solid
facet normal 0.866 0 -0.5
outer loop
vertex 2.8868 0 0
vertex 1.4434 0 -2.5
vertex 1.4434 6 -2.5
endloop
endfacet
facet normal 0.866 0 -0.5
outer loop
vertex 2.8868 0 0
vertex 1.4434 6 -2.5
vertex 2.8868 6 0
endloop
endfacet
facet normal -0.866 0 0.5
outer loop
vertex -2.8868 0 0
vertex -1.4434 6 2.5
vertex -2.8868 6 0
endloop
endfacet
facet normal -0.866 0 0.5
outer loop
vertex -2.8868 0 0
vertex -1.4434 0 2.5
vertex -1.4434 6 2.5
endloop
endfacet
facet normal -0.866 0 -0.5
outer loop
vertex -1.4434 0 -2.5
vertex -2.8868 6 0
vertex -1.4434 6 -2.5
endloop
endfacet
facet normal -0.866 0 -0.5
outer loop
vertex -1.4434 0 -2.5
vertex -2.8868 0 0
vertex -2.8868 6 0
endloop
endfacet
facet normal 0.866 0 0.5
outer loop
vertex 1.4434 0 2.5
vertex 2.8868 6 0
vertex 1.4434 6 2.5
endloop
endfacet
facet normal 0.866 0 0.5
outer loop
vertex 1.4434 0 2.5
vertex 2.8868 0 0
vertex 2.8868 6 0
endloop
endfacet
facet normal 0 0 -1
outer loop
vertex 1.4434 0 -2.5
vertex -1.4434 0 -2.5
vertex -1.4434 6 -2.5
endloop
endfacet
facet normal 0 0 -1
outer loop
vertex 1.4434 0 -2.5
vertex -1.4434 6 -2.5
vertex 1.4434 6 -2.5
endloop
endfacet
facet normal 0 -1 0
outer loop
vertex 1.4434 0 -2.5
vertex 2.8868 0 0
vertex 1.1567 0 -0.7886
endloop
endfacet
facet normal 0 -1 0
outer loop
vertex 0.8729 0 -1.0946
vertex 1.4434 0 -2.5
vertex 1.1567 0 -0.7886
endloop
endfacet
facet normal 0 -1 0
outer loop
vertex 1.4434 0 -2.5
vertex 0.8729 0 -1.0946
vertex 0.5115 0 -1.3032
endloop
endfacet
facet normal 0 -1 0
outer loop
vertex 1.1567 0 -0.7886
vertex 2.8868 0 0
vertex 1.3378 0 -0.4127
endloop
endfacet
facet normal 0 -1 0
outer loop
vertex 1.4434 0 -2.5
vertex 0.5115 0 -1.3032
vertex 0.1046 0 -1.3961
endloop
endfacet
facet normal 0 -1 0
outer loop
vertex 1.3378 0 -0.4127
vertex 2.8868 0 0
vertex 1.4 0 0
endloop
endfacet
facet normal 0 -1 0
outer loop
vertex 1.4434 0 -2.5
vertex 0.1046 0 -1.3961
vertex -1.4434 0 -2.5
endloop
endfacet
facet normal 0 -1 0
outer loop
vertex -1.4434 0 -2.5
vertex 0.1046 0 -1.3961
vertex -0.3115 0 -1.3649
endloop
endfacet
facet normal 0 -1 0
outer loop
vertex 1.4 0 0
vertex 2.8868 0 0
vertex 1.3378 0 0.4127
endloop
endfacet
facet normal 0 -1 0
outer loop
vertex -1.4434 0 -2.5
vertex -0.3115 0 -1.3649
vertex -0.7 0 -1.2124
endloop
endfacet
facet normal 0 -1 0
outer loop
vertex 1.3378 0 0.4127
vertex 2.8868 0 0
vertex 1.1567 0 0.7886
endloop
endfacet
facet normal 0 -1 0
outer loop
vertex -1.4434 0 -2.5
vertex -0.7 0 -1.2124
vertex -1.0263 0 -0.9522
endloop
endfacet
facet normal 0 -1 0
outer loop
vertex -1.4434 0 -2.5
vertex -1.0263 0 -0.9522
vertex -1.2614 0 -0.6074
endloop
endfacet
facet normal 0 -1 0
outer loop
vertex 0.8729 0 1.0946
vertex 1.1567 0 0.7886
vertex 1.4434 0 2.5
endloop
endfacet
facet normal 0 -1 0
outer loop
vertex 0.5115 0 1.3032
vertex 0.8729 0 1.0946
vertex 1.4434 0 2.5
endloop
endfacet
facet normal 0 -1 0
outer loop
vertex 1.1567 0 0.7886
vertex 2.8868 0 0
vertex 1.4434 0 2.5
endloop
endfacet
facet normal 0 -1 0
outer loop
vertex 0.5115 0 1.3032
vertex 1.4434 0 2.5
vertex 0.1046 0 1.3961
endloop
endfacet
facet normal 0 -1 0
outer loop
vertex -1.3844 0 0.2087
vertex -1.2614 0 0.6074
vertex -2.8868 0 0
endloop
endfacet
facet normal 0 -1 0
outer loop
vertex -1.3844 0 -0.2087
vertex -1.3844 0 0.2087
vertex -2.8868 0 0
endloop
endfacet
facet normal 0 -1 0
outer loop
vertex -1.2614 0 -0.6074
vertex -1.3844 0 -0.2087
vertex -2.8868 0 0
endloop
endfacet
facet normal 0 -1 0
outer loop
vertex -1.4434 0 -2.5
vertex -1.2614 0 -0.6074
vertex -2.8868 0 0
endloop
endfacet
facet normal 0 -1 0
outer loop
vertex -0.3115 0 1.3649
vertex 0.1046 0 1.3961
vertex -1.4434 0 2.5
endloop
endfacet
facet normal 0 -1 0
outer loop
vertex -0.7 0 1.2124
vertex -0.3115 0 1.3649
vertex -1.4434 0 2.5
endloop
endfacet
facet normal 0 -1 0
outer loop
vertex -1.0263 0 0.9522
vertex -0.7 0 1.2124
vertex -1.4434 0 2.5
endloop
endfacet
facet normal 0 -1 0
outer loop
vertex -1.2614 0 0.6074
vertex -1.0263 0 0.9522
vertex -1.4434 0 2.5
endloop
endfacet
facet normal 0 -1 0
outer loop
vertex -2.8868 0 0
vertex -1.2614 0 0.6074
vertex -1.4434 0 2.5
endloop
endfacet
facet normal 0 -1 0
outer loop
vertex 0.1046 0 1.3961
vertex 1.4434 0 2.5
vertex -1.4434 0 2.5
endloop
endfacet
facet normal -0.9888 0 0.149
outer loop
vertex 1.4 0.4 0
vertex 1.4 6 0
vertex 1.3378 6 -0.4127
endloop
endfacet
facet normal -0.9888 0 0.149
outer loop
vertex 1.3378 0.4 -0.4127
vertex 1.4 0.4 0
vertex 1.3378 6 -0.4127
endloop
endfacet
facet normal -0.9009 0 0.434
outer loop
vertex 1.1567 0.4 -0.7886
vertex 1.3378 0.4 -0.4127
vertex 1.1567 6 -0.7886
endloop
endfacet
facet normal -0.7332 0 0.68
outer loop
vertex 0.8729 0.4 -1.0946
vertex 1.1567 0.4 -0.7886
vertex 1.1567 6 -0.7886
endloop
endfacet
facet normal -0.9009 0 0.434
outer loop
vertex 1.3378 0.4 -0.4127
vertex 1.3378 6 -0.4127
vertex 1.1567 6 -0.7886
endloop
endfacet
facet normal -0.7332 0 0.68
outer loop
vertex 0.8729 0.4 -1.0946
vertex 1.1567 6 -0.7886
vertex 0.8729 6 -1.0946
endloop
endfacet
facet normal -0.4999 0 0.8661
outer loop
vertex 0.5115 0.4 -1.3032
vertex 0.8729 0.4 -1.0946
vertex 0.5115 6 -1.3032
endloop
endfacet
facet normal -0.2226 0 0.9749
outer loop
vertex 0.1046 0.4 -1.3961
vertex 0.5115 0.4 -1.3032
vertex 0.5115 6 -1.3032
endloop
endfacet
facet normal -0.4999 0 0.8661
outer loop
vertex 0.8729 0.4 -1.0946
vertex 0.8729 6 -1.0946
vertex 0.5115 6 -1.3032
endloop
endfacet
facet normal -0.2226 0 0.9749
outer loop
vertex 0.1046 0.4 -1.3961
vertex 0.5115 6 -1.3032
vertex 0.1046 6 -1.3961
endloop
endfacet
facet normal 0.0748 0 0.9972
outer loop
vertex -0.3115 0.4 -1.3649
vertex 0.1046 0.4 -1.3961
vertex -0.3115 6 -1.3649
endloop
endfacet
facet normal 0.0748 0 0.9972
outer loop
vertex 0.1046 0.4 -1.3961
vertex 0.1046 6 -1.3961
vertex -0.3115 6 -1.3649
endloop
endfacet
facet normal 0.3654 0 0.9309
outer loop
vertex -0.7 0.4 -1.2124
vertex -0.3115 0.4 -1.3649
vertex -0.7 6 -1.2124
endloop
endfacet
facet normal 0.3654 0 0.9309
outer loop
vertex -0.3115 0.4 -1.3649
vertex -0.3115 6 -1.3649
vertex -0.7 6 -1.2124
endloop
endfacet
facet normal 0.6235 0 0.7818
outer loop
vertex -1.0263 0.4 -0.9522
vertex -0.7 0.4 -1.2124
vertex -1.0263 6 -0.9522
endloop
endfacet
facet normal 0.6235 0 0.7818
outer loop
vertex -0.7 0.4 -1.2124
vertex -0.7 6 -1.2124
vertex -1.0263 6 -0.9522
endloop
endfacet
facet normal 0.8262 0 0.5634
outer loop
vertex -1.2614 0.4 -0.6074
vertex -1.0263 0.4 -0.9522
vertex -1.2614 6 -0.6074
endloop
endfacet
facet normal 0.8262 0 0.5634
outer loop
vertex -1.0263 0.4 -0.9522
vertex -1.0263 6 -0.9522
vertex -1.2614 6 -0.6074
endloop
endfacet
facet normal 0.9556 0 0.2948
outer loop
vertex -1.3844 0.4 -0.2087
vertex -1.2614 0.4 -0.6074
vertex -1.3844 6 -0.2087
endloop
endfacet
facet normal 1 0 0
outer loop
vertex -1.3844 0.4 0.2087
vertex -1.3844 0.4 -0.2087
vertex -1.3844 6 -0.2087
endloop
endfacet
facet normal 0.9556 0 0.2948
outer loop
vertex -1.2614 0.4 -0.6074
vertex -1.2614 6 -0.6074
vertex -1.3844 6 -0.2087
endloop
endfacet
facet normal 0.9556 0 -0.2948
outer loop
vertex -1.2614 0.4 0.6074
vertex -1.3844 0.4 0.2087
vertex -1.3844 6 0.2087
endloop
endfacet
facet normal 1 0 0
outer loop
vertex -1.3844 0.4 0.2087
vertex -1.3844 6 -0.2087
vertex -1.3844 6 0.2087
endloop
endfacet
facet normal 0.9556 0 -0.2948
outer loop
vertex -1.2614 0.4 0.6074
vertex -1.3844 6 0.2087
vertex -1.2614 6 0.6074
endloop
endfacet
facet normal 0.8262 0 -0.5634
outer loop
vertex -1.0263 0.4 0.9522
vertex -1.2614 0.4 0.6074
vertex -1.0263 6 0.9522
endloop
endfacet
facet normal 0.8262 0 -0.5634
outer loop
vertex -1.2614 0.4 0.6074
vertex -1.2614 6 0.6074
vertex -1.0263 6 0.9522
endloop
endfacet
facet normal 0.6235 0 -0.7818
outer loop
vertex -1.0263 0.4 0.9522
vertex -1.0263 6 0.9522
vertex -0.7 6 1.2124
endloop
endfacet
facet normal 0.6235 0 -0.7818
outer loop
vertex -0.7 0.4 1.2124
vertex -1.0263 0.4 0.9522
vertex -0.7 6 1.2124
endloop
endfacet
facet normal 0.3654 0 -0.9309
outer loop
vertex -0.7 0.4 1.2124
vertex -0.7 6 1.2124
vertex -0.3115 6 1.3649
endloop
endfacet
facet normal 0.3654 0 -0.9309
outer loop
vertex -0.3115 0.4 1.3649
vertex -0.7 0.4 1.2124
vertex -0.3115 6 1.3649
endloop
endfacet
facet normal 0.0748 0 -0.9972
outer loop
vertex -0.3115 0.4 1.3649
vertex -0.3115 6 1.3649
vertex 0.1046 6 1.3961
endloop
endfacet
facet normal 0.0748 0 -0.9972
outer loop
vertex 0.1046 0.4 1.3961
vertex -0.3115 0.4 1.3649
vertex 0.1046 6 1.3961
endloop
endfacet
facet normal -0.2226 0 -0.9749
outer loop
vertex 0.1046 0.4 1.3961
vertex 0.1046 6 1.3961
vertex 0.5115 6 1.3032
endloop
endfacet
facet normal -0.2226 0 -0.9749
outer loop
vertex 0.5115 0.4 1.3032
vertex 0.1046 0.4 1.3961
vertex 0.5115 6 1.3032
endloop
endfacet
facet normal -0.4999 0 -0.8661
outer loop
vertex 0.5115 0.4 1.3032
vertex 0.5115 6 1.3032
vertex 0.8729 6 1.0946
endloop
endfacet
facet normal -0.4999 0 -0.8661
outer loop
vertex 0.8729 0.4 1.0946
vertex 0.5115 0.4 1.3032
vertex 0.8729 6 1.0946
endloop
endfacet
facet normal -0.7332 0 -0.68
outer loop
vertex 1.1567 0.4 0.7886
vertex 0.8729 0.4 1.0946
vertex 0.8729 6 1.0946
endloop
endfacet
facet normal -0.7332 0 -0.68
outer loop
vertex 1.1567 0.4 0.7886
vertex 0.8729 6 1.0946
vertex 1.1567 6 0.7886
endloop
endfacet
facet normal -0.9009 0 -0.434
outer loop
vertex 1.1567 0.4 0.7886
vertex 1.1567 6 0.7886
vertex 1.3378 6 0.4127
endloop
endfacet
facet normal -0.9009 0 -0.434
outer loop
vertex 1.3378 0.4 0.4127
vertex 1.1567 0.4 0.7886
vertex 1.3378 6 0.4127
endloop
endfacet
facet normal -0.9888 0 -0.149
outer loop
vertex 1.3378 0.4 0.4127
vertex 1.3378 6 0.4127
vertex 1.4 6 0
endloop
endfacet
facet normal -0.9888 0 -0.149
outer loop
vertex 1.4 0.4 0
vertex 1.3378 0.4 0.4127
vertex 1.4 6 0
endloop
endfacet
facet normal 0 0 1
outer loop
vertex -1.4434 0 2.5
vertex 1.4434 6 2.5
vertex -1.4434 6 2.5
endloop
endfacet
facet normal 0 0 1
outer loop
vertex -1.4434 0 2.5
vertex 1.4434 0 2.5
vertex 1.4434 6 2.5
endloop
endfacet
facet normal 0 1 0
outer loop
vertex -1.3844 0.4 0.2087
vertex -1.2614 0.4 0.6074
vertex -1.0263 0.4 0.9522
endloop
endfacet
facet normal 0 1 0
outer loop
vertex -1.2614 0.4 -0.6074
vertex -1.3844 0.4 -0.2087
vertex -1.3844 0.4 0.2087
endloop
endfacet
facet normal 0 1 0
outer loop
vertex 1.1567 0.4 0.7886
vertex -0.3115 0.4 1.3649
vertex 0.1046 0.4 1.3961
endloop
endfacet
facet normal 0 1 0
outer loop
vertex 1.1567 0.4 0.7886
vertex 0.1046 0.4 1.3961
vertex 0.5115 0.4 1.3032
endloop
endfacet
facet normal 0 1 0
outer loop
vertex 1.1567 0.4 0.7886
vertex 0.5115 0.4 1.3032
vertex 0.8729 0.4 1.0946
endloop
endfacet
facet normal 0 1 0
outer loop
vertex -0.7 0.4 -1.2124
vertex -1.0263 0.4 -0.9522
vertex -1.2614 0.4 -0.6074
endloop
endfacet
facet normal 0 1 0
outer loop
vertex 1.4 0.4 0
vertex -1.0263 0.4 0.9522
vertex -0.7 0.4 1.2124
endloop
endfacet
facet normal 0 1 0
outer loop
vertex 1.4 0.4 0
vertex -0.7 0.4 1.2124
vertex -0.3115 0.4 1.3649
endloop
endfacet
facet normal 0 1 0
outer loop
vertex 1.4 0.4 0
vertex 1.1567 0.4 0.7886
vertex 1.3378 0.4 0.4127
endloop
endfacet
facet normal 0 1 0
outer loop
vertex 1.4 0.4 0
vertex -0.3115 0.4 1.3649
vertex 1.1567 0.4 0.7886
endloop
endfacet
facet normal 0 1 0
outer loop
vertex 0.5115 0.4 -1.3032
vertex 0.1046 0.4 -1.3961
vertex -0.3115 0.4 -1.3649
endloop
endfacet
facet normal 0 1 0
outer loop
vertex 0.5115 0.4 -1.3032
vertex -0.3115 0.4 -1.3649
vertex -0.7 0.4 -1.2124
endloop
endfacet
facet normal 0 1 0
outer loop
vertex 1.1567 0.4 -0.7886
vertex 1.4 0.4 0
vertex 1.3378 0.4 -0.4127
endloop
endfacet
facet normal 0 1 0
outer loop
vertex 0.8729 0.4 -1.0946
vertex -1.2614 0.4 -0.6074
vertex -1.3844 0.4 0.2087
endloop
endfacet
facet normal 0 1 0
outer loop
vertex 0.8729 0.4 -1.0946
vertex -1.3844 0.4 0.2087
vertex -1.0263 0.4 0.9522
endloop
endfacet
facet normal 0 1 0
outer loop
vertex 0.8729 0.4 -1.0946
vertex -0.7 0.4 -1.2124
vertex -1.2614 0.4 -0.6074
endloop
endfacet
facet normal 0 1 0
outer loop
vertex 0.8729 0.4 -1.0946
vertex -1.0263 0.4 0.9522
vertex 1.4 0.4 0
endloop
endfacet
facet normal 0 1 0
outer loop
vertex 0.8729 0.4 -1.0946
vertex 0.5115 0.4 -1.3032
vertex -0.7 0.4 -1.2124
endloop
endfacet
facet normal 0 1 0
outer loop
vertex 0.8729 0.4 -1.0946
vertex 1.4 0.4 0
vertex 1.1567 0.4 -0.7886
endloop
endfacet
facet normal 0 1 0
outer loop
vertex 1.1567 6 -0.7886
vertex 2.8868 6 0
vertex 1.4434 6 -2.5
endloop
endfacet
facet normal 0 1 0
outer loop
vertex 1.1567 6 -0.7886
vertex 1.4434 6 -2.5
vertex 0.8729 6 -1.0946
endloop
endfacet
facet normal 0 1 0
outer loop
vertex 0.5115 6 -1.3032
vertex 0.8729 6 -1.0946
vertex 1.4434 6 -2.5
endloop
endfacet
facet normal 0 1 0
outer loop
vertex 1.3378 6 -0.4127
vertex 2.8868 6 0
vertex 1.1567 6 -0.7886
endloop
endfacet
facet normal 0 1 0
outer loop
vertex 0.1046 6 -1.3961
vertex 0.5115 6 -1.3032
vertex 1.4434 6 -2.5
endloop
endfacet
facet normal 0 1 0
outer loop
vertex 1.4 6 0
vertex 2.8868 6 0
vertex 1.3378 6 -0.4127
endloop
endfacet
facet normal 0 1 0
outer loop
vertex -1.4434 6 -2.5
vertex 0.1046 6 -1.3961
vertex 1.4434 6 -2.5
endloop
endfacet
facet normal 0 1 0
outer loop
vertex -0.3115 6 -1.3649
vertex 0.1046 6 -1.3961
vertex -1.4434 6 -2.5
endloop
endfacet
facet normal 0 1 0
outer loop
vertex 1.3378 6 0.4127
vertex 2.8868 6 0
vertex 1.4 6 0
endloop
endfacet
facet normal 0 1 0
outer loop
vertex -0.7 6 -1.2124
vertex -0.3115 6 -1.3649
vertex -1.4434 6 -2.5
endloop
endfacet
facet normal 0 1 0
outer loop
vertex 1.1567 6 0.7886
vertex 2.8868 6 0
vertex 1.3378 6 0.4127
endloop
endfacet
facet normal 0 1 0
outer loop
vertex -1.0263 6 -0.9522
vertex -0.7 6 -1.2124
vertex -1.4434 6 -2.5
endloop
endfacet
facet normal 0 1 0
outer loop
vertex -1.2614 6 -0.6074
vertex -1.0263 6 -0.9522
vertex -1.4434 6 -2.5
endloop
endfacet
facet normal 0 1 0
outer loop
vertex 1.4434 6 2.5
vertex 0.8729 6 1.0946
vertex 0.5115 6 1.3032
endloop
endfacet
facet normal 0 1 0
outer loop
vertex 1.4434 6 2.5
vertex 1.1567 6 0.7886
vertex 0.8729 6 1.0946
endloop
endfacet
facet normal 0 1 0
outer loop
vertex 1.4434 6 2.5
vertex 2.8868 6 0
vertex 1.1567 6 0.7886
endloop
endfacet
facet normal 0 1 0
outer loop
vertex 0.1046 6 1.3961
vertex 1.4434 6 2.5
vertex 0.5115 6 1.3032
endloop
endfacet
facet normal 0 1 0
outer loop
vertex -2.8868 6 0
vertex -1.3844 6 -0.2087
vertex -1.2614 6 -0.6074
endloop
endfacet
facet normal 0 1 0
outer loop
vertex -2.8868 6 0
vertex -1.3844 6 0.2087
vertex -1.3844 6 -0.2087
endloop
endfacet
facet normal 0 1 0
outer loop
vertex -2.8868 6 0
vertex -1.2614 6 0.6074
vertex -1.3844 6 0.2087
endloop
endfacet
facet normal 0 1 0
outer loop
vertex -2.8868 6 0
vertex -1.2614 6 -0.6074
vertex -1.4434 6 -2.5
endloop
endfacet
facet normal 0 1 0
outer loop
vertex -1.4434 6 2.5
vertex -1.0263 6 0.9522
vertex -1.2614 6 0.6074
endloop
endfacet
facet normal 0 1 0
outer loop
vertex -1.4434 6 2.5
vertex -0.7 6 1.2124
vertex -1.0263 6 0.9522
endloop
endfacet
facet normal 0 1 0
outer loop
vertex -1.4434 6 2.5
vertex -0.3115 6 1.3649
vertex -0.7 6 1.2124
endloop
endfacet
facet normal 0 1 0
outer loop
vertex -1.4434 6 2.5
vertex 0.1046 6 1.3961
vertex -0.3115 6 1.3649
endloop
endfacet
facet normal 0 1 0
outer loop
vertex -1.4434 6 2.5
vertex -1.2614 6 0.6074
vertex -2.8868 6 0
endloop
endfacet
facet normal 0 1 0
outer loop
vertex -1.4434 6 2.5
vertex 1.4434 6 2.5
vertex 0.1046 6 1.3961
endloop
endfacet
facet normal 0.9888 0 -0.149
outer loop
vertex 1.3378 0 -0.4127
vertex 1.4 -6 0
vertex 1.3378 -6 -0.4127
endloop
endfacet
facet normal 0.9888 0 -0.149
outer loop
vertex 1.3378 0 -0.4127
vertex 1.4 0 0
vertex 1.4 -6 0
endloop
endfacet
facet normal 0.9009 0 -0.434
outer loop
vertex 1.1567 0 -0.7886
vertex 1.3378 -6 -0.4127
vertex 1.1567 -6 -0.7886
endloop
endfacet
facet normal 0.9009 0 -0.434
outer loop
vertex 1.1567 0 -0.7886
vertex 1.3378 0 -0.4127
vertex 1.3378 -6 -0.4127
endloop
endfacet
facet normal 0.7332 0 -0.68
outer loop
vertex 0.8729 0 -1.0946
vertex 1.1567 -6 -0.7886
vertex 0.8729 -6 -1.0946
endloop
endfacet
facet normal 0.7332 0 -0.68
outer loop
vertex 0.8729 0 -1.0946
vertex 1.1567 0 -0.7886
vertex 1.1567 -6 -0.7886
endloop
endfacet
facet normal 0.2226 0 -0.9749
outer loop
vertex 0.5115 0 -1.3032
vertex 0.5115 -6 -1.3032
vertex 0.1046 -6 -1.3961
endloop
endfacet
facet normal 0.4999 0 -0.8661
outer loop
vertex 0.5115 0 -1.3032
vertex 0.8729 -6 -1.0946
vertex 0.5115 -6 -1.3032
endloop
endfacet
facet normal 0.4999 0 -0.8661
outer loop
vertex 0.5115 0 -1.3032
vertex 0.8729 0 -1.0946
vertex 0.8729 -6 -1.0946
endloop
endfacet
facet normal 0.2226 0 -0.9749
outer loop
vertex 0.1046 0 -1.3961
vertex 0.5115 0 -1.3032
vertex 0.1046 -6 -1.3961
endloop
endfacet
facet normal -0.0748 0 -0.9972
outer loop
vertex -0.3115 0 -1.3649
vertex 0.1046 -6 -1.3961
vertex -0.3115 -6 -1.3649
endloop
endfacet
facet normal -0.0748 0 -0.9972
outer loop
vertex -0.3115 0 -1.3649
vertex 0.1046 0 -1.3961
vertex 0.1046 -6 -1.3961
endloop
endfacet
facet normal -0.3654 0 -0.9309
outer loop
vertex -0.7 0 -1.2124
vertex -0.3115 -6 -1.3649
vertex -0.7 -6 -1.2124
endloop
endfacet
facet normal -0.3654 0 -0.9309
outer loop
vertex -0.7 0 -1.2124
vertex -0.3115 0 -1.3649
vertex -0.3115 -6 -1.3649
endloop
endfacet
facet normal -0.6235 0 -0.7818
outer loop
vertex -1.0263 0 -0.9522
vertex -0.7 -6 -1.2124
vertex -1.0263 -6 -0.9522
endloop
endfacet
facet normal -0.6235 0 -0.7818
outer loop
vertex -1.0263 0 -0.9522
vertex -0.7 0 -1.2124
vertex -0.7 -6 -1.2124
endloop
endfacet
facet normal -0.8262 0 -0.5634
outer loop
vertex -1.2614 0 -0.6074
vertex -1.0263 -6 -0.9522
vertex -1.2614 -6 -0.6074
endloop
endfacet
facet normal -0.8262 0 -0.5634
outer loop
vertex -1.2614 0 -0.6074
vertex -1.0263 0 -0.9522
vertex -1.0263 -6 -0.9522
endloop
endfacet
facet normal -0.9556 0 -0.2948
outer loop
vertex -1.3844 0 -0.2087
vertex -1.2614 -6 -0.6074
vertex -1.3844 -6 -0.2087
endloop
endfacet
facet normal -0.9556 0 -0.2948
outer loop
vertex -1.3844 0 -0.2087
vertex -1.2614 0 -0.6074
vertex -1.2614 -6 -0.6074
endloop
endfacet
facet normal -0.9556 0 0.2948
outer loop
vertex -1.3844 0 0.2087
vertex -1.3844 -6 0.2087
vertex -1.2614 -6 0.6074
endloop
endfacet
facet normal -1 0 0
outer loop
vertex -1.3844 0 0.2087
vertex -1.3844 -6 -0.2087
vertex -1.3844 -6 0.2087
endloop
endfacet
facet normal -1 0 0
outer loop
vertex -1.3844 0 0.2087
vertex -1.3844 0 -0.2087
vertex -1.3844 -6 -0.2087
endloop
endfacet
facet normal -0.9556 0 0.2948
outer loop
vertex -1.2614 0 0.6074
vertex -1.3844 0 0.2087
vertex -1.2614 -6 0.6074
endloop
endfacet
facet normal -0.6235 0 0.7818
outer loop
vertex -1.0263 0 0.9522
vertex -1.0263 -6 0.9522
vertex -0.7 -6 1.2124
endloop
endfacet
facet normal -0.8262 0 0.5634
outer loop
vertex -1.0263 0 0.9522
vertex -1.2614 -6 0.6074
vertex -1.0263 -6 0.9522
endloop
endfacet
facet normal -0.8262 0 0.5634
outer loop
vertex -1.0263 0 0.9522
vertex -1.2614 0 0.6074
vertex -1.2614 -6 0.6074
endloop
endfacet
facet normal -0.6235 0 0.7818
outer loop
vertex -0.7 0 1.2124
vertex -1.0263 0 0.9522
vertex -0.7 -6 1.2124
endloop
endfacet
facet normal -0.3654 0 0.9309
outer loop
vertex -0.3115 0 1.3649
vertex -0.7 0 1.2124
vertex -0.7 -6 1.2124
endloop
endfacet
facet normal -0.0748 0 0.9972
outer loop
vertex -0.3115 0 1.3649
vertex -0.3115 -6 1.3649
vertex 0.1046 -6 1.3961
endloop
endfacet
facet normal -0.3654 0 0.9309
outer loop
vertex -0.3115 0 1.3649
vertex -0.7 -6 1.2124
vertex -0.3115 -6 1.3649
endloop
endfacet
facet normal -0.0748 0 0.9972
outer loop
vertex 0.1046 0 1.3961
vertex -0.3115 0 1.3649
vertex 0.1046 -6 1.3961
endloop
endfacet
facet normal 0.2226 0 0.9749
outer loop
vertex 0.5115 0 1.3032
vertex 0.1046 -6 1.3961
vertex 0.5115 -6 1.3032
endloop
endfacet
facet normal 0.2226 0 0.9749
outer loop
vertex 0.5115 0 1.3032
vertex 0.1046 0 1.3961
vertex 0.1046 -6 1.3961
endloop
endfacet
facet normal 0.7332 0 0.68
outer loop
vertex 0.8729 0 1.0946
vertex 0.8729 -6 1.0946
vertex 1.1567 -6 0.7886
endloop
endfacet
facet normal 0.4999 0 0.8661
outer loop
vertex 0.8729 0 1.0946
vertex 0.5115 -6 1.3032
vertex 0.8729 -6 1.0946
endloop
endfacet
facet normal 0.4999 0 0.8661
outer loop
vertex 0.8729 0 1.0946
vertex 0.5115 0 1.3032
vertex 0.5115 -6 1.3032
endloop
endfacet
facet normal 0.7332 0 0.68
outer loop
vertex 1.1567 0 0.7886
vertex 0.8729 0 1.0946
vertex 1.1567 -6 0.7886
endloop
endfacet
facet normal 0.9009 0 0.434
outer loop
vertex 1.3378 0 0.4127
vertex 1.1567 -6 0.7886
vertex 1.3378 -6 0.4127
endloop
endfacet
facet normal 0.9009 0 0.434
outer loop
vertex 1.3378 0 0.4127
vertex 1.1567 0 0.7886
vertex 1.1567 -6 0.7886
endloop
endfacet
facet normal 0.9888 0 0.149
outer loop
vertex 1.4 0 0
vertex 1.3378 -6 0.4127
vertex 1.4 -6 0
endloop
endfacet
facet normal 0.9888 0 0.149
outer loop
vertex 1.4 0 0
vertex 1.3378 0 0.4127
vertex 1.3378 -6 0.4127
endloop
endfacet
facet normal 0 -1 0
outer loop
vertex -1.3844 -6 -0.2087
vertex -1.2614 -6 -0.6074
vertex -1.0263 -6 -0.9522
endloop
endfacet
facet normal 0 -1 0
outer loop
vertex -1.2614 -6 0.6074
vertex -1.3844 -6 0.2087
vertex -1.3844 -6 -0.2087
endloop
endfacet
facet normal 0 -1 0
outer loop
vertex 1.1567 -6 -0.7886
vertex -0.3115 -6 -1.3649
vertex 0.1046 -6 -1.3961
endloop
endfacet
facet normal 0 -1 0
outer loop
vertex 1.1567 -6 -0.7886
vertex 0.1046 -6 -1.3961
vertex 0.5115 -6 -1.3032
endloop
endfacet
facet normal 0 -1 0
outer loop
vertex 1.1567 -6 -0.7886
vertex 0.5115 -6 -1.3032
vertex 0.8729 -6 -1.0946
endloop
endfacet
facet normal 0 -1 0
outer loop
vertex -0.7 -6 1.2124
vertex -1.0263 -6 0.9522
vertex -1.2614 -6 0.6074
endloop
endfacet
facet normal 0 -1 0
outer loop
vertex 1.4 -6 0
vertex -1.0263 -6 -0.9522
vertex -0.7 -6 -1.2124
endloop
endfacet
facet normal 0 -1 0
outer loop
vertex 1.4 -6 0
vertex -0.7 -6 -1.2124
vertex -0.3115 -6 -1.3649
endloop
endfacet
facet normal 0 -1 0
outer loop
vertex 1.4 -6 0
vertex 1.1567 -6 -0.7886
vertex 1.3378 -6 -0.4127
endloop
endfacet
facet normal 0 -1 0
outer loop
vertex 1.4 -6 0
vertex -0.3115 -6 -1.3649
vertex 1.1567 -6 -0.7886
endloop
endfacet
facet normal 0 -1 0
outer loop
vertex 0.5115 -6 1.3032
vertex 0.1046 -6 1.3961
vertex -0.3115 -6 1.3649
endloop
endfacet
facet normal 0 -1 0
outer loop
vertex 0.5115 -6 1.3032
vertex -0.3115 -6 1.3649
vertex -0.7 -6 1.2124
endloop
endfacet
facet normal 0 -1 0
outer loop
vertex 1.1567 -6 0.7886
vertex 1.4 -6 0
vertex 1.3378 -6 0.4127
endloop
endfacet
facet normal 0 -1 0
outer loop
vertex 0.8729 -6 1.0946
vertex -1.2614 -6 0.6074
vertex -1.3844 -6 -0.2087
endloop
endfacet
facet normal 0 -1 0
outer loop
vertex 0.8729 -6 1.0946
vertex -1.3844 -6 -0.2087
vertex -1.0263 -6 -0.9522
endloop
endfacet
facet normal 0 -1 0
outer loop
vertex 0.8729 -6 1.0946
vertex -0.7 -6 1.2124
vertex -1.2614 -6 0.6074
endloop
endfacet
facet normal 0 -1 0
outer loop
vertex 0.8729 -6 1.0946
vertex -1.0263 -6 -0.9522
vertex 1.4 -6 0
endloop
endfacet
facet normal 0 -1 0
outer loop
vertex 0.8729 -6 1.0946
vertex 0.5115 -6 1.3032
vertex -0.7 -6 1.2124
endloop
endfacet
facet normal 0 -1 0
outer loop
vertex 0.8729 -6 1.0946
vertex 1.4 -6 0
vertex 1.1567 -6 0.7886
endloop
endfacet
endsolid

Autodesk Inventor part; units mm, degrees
ref_plane "YZ Plane" through (0, 0, 0) normal (1, 0, 0) x (0, 1, 0)
ref_plane "XZ Plane" through (0, 0, 0) normal (0, 1, 0) x (-1, 0, 0)
ref_plane "XY Plane" through (0, 0, 0) normal (0, 0, 1) x (1, 0, 0)
sketch "Эскиз1" plane through (0, 0, 0) normal (0, 1, 0) x (-1, 0, 0)
  line L0 (2.8868, 0) -> (1.4434, -2.5)
  line L1 (1.4434, -2.5) -> (-1.4434, -2.5)
  line L2 (-1.4434, -2.5) -> (-2.8868, 0)
  line L3 (-2.8868, 0) -> (-1.4434, 2.5)
  line L4 (-1.4434, 2.5) -> (1.4434, 2.5)
  line L5 (1.4434, 2.5) -> (2.8868, 0)
  point P0 (0, 0)
  point P1 (0, 0)
  dimension "d0" = 5
extrude "Выдавливание1" add sketch "Эскиз1" along normal blind 6
sketch "Эскиз2" plane through (0, 0, 0) normal (0, -1, 0) x (1, 0, 0)
  circle A0 centre (0, 0) radius 1.4
  dimension "d3" = 2.8
extrude "Выдавливание2" add sketch "Эскиз2" along normal blind 6
sketch "Эскиз3" plane through (0, 6, 0) normal (0, 1, 0) x (1, 0, 0)
  circle A0 centre (0, 0) radius 1.4
  dimension "d6" = 2.8
extrude "Выдавливание3" cut sketch "Эскиз3" against normal blind 5.6
thread "Резьба1" size "M3x0.5" class "6g" standard "ANSI Metric M Profile" full length
thread "Резьба2" size "M3x0.5" class "6H" standard "ANSI Metric M Profile" full length
properties part number "M3_MF_6mm"
